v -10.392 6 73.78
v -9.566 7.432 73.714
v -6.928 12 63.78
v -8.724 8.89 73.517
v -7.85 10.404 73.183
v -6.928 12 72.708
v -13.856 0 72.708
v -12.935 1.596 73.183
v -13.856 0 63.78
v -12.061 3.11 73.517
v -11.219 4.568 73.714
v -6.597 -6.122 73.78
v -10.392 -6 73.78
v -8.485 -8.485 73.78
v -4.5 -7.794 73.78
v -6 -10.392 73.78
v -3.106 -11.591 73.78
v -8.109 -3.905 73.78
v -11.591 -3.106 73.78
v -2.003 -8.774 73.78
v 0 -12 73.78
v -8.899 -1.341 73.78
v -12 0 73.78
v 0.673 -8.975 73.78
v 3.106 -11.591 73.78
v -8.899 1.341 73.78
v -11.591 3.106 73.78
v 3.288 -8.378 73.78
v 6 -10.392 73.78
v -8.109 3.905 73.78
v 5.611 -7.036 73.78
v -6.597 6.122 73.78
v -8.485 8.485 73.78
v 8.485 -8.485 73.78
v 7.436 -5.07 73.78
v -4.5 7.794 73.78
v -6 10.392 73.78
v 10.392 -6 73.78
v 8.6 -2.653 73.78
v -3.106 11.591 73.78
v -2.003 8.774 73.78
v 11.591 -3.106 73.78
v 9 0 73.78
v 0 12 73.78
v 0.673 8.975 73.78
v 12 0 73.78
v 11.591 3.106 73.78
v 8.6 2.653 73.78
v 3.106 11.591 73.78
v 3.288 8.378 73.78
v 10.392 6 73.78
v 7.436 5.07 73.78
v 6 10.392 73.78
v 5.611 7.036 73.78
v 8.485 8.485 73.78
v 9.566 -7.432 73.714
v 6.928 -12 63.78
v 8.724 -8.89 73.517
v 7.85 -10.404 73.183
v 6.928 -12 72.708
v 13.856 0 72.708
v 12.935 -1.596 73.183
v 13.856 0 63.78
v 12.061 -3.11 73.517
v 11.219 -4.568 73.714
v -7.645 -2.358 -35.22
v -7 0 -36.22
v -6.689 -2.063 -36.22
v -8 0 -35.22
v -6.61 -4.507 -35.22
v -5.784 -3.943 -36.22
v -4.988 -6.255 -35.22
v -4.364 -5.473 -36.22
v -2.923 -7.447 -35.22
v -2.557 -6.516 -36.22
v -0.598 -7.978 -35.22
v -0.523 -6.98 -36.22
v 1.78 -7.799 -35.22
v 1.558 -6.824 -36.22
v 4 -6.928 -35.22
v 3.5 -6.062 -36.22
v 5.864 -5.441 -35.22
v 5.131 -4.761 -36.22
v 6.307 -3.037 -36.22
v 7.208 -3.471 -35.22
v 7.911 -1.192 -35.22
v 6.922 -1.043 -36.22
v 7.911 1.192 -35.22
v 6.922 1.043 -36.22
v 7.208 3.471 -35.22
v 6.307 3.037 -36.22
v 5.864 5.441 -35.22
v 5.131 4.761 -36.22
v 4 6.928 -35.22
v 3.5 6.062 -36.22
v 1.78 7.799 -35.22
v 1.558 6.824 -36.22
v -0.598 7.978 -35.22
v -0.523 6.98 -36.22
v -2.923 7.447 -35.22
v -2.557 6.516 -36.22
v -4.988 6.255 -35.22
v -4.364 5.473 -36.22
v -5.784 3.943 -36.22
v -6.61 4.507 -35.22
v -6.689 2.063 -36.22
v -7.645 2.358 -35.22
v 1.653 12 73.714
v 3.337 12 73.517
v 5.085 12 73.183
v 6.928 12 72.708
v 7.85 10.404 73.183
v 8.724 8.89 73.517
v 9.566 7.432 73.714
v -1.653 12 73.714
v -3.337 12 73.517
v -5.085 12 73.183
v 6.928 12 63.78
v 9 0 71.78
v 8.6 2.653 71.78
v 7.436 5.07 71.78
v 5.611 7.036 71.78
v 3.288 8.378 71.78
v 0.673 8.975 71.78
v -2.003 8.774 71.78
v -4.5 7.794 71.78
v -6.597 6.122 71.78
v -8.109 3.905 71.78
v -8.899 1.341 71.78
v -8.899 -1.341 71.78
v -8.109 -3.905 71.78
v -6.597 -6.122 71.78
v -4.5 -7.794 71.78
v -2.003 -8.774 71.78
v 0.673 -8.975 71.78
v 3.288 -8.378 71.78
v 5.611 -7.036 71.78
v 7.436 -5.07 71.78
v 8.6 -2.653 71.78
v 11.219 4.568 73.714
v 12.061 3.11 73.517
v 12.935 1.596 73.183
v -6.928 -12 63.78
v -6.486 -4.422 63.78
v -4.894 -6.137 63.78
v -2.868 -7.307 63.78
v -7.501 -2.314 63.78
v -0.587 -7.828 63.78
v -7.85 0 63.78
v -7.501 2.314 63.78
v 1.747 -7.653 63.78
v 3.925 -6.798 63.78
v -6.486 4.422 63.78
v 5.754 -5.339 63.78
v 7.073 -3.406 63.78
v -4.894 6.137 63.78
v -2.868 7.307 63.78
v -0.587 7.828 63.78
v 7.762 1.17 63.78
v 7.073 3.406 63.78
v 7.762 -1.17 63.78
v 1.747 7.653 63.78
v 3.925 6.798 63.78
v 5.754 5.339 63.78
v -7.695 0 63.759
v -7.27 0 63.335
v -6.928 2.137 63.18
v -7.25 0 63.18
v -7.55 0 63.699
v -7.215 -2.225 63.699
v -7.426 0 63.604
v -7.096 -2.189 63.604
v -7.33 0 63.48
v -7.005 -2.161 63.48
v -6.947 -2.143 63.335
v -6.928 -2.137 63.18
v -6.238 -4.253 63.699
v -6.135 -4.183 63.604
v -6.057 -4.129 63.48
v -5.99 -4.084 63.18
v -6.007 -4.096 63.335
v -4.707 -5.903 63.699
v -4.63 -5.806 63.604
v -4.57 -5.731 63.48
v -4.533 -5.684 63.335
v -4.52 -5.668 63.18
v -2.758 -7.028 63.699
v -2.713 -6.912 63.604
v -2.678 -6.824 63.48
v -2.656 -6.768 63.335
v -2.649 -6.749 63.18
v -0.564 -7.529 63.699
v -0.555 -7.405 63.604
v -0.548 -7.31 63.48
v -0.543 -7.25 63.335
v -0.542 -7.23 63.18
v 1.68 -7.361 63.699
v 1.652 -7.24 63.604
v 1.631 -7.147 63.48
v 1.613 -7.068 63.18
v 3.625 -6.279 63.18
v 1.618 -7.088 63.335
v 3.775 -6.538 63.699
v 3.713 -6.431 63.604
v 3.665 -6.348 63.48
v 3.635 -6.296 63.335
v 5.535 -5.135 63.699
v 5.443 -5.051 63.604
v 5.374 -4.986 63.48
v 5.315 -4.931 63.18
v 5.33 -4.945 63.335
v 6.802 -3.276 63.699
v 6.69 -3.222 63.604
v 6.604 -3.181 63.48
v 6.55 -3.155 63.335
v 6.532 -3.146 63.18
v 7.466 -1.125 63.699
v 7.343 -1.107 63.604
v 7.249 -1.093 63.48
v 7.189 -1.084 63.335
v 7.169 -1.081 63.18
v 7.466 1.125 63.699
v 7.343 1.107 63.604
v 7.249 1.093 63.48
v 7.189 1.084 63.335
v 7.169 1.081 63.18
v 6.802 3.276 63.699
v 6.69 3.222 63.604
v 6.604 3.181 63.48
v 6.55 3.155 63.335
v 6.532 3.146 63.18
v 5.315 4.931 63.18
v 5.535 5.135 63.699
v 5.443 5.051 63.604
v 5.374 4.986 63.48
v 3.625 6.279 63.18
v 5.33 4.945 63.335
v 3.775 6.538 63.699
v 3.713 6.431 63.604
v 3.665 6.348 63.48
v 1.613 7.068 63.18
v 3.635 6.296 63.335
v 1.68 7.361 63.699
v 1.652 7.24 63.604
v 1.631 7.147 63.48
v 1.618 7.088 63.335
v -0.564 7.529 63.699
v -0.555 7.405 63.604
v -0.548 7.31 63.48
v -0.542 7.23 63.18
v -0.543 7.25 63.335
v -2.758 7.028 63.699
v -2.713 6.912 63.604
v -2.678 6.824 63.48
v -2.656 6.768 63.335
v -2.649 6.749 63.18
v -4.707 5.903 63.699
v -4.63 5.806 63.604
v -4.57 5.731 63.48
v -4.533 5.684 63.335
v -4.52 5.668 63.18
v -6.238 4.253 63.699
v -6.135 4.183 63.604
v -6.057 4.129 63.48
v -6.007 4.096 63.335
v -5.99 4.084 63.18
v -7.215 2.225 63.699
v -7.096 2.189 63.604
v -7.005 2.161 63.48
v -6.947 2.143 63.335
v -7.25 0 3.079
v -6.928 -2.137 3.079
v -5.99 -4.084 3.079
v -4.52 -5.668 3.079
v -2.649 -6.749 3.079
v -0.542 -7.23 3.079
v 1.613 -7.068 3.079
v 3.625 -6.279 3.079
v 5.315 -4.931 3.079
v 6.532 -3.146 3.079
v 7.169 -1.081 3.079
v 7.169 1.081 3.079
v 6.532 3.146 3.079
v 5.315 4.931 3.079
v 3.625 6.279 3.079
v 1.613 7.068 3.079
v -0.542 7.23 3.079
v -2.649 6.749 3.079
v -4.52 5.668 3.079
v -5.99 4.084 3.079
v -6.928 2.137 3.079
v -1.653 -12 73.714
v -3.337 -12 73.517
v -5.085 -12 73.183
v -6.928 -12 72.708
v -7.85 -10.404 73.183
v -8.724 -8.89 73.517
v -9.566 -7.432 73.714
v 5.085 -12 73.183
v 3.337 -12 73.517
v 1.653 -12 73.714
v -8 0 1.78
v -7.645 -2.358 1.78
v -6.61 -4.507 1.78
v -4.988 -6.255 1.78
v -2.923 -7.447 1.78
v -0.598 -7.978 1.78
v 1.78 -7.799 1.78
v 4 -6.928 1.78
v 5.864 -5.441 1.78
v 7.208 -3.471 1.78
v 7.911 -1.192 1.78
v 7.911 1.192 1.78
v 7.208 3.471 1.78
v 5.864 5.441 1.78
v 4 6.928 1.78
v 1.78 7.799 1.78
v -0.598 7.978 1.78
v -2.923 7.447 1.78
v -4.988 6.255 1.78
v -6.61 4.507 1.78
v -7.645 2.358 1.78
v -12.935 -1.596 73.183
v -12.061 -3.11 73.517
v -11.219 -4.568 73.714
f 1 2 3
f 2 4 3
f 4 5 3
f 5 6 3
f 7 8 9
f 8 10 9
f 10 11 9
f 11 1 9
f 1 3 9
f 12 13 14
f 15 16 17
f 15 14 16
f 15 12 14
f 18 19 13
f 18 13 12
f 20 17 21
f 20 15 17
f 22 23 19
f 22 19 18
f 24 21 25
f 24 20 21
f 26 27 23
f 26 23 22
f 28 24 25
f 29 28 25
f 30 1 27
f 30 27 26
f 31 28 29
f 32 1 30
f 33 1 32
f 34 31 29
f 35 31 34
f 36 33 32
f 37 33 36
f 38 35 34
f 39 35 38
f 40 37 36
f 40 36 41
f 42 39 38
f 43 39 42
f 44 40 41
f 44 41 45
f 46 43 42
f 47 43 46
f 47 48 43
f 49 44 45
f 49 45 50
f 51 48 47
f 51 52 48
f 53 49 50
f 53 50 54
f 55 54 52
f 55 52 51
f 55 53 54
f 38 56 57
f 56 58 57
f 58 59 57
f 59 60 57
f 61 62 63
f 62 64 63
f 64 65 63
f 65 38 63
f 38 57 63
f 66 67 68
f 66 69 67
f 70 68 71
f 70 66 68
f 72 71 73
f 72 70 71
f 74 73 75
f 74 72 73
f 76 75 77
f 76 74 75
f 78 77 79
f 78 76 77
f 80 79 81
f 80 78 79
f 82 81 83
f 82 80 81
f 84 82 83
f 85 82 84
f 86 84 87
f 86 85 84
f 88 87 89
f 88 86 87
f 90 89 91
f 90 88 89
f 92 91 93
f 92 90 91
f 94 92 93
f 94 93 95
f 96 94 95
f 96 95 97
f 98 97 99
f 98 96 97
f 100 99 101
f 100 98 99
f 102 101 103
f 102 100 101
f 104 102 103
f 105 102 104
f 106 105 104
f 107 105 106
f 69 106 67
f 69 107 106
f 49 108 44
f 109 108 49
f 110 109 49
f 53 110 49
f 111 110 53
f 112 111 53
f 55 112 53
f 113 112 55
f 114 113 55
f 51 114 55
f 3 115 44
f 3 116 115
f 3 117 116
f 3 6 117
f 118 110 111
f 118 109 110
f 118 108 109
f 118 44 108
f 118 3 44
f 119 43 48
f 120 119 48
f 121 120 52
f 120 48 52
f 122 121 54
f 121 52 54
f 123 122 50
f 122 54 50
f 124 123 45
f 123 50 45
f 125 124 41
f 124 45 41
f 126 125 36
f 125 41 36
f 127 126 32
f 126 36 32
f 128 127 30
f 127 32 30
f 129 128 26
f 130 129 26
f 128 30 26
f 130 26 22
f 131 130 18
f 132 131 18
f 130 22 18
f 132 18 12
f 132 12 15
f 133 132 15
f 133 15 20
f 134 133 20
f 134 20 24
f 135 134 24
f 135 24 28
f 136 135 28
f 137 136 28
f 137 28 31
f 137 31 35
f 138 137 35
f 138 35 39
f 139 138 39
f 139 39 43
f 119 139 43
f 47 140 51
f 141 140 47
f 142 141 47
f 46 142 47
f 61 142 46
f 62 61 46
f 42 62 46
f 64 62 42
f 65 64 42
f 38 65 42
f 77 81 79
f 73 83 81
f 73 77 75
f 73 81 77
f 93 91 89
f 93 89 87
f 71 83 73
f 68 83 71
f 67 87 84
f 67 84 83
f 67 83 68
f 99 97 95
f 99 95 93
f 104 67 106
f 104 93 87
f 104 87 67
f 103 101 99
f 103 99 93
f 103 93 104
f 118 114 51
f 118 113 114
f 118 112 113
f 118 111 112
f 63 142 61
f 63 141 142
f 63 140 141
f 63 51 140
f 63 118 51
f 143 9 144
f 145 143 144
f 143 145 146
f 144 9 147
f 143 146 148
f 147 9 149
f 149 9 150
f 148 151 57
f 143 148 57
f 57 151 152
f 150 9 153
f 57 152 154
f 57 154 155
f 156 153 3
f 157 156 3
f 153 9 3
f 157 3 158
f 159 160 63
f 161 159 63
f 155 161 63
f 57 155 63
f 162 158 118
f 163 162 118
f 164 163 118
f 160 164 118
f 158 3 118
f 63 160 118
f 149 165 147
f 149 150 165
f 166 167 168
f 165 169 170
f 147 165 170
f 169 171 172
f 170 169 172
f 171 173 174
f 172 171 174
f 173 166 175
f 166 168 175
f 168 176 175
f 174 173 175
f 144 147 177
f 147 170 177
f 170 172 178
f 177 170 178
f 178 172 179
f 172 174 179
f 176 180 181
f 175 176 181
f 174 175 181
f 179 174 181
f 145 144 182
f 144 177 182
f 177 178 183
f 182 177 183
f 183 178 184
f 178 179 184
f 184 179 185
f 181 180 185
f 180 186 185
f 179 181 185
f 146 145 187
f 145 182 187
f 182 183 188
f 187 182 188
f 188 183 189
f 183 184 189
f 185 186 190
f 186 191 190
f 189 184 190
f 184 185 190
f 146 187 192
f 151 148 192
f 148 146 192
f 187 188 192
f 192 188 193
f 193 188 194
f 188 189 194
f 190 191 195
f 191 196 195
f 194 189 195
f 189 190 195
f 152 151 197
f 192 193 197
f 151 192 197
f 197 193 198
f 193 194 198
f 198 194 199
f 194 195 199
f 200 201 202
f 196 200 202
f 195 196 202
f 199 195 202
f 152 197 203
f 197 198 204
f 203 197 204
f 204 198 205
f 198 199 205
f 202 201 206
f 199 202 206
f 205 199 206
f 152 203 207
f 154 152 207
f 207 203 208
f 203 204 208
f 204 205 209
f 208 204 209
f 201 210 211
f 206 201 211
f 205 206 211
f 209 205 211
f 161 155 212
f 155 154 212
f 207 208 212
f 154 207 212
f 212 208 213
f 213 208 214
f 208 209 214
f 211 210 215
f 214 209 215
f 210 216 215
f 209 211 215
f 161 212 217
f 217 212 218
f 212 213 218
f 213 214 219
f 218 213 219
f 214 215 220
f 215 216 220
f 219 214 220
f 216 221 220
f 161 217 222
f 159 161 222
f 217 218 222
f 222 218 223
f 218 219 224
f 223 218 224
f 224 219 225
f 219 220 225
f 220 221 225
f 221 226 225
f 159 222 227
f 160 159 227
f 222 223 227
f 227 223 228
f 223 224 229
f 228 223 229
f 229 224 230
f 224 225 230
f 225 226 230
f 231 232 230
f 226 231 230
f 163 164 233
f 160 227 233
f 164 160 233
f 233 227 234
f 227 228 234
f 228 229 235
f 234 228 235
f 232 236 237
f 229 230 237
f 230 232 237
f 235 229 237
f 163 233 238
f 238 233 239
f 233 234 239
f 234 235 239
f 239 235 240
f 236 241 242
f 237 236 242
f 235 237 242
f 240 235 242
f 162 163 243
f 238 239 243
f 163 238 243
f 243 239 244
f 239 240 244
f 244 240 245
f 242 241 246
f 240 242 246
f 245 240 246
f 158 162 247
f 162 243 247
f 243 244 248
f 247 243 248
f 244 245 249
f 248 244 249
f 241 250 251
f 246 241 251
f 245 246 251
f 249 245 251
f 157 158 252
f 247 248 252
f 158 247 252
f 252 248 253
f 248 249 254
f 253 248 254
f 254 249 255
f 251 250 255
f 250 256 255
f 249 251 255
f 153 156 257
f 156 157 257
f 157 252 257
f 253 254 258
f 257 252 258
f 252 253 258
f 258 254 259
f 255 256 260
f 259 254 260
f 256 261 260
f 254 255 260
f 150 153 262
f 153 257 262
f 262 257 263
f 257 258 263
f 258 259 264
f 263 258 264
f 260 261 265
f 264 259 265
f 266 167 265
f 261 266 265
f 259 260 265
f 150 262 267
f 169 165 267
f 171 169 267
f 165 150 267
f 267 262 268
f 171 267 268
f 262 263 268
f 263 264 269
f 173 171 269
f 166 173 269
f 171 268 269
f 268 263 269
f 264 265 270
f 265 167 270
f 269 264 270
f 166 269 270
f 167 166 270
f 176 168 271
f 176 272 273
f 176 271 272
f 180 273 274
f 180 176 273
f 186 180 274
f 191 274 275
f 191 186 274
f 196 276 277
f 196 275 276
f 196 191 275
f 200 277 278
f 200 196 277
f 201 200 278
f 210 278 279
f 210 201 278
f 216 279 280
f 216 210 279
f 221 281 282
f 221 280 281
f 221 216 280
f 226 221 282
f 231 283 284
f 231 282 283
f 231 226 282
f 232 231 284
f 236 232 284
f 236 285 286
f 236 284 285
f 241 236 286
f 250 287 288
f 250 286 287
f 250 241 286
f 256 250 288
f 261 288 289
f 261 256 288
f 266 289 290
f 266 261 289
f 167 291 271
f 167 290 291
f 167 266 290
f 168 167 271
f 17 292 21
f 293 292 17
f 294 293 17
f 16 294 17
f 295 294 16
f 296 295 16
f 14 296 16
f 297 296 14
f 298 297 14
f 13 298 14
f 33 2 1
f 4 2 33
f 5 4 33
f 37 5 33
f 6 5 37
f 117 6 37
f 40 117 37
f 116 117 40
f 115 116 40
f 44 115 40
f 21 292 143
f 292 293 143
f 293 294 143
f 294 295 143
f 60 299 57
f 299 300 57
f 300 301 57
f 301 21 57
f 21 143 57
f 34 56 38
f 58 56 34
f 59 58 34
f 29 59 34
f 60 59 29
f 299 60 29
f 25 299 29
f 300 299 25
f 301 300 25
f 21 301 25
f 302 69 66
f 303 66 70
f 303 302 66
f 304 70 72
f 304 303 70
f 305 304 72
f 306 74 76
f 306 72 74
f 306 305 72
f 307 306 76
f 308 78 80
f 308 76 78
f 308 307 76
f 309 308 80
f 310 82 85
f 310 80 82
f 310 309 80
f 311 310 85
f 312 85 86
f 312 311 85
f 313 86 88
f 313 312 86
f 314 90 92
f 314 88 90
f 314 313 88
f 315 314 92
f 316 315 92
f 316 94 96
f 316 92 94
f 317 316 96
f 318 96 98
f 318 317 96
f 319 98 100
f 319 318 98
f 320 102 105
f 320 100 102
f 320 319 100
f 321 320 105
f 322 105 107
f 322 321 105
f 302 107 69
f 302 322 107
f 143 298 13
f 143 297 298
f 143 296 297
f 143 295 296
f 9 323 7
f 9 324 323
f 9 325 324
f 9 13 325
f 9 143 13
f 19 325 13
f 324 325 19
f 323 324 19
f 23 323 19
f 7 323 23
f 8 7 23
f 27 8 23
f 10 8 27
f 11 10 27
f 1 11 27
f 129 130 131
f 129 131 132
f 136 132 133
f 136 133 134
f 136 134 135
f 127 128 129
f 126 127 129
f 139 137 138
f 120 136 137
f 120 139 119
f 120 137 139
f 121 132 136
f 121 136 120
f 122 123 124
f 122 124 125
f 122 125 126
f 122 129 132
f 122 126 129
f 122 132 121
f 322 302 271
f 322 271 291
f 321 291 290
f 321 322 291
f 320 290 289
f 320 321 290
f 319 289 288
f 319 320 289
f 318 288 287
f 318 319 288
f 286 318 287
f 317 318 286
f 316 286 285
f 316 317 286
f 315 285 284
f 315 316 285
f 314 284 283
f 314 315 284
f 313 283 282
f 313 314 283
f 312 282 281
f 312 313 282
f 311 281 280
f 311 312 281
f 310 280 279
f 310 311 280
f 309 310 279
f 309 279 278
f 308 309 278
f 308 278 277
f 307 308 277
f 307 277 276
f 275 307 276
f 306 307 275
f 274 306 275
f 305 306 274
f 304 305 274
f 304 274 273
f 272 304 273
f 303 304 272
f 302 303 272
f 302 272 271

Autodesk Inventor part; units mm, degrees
ref_plane "YZ Plane" through (0, 0, 0) normal (1, 0, 0) x (0, 1, 0)
sketch "Sketch2" plane through (0, 0, 0) normal (0, 1, 0) x (-1, 0, 0)
  line L0 (0, 63.7798) -> (0, -36.2202)
  line L1 (0, -36.2202) -> (7, -36.2202)
  line L2 (8, -35.2202) -> (8, 1.7798)
  line L3 (8, 1.7798) -> (7.25, 3.0788)
  line L4 (7.25, 3.0788) -> (7.25, 63.7798)
  line L5 (7.25, 63.7798) -> (0, 63.7798)
  line L6 (7, -36.2202) -> (8, -35.2202)
  line L7 (8, -36.2202) -> (8, -37.6344)
  line L8 (0, -57.9172) -> (0, 84.0627) projected
  dimension "Ds" = 14.5
  dimension "NND" = 16
  dimension "b" = 38
  dimension "d3" = 30
  dimension "d5" = 45
  dimension "PTC" = 2
  dimension "NLG" = 100
revolve "Revolution1" add sketch "Sketch2" angle 360 about axis through (0, 0, 63.7798) along (0, 0, -1)
sketch "Sketch3" plane through (0, 0, 63.7798) normal (0, 0, 1) x (1, 0, 0)
  circle A0 centre (0, 0) radius 7.25 projected
  line L0 (0, 12) -> (6.9282, 12)
  line L1 (6.9282, 12) -> (13.8564, 0)
  line L2 (13.8564, 0) -> (0, 0)
  line L3 (0, 0) -> (0, 12)
  line L4 (0, 12) -> (-6.9282, 12)
  line L5 (-6.9282, 12) -> (-13.8564, 0)
  line L6 (0, -12) -> (6.9282, -12)
  line L7 (6.9282, -12) -> (13.8564, 0)
  line L8 (-6.9282, -12) -> (-13.8564, 0)
  line L9 (0, -12) -> (-6.9282, -12)
  dimension "d9" = 60
  dimension "ParS" = 24
  dimension "msp_d11" = 24
extrude "Extrusion1" add sketch "Sketch3" along normal blind 10
sketch "Sketch4" plane through (0, 0, 0) normal (0, 1, 0) x (-1, 0, 0)
  line L0 (-12, 73.7798) -> (-13.8564, 73.7798)
  line L1 (-13.8564, 73.7798) -> (-13.8564, 72.708)
  line L2 (-13.8564, 72.708) -> (-12, 73.7798)
  line L3 (0, 17.8585) -> (0, 83.1) projected
  line L4 (0, 28.2505) -> (0, 27.1787)
  line L5 (-13.8564, 63.7798) -> (-13.8564, 73.7798) projected
  line L6 (-6.9282, 73.7798) -> (-13.8564, 73.7798) projected
  dimension "d14" = 30
  dimension "msp_d15" = 24
revolve "Revolution2" cut sketch "Sketch4" angle 360 about axis through (0, 0, 28.2505) along (0, 0, -1)
sketch "Sketch5" plane through (0, 0, 73.7798) normal (0, 0, 1) x (1, 0, 0)
  arc A0 (10.3923, 6) -> (0, 12) centre (0, 0) ccw projected
  circle A1 centre (0, 0) radius 9
  dimension "d27" = 18
extrude "Extrusion2" cut sketch "Sketch5" against normal blind 2
thread "Thread1" size "M16x2" class "6g" standard "ISO Metric profile" full length
ref_plane "MSC_PF1" through (0, 0, 0) normal (0, 1, 0) x (-1, 0, 0)
ref_plane "MSC_PT1" through (0, 0, 63.7798) normal (0, 0, -1) x (-1, 0, 0)
fillet "Fillet1" radius 0.6 1 edges at (7.25, 0, 63.7798)
equation "\"msp_d11\" = ParS"
equation "\"msp_d15\" = ParS"
equation "\"d27\" = 0.75 * ParS"
equation "\"d28\" = 0.2 * ParK"
equation "\"d30\" = r"
equation "\"msp_d17\" = b"
equation "\"r\" = 0.6"
equation "\"THREADDIA\" = NND"
equation "\"ParK\" = 10"
properties part number "NF EN ISO 4015 - M16x100" material "Stainless Steel, 440C"
